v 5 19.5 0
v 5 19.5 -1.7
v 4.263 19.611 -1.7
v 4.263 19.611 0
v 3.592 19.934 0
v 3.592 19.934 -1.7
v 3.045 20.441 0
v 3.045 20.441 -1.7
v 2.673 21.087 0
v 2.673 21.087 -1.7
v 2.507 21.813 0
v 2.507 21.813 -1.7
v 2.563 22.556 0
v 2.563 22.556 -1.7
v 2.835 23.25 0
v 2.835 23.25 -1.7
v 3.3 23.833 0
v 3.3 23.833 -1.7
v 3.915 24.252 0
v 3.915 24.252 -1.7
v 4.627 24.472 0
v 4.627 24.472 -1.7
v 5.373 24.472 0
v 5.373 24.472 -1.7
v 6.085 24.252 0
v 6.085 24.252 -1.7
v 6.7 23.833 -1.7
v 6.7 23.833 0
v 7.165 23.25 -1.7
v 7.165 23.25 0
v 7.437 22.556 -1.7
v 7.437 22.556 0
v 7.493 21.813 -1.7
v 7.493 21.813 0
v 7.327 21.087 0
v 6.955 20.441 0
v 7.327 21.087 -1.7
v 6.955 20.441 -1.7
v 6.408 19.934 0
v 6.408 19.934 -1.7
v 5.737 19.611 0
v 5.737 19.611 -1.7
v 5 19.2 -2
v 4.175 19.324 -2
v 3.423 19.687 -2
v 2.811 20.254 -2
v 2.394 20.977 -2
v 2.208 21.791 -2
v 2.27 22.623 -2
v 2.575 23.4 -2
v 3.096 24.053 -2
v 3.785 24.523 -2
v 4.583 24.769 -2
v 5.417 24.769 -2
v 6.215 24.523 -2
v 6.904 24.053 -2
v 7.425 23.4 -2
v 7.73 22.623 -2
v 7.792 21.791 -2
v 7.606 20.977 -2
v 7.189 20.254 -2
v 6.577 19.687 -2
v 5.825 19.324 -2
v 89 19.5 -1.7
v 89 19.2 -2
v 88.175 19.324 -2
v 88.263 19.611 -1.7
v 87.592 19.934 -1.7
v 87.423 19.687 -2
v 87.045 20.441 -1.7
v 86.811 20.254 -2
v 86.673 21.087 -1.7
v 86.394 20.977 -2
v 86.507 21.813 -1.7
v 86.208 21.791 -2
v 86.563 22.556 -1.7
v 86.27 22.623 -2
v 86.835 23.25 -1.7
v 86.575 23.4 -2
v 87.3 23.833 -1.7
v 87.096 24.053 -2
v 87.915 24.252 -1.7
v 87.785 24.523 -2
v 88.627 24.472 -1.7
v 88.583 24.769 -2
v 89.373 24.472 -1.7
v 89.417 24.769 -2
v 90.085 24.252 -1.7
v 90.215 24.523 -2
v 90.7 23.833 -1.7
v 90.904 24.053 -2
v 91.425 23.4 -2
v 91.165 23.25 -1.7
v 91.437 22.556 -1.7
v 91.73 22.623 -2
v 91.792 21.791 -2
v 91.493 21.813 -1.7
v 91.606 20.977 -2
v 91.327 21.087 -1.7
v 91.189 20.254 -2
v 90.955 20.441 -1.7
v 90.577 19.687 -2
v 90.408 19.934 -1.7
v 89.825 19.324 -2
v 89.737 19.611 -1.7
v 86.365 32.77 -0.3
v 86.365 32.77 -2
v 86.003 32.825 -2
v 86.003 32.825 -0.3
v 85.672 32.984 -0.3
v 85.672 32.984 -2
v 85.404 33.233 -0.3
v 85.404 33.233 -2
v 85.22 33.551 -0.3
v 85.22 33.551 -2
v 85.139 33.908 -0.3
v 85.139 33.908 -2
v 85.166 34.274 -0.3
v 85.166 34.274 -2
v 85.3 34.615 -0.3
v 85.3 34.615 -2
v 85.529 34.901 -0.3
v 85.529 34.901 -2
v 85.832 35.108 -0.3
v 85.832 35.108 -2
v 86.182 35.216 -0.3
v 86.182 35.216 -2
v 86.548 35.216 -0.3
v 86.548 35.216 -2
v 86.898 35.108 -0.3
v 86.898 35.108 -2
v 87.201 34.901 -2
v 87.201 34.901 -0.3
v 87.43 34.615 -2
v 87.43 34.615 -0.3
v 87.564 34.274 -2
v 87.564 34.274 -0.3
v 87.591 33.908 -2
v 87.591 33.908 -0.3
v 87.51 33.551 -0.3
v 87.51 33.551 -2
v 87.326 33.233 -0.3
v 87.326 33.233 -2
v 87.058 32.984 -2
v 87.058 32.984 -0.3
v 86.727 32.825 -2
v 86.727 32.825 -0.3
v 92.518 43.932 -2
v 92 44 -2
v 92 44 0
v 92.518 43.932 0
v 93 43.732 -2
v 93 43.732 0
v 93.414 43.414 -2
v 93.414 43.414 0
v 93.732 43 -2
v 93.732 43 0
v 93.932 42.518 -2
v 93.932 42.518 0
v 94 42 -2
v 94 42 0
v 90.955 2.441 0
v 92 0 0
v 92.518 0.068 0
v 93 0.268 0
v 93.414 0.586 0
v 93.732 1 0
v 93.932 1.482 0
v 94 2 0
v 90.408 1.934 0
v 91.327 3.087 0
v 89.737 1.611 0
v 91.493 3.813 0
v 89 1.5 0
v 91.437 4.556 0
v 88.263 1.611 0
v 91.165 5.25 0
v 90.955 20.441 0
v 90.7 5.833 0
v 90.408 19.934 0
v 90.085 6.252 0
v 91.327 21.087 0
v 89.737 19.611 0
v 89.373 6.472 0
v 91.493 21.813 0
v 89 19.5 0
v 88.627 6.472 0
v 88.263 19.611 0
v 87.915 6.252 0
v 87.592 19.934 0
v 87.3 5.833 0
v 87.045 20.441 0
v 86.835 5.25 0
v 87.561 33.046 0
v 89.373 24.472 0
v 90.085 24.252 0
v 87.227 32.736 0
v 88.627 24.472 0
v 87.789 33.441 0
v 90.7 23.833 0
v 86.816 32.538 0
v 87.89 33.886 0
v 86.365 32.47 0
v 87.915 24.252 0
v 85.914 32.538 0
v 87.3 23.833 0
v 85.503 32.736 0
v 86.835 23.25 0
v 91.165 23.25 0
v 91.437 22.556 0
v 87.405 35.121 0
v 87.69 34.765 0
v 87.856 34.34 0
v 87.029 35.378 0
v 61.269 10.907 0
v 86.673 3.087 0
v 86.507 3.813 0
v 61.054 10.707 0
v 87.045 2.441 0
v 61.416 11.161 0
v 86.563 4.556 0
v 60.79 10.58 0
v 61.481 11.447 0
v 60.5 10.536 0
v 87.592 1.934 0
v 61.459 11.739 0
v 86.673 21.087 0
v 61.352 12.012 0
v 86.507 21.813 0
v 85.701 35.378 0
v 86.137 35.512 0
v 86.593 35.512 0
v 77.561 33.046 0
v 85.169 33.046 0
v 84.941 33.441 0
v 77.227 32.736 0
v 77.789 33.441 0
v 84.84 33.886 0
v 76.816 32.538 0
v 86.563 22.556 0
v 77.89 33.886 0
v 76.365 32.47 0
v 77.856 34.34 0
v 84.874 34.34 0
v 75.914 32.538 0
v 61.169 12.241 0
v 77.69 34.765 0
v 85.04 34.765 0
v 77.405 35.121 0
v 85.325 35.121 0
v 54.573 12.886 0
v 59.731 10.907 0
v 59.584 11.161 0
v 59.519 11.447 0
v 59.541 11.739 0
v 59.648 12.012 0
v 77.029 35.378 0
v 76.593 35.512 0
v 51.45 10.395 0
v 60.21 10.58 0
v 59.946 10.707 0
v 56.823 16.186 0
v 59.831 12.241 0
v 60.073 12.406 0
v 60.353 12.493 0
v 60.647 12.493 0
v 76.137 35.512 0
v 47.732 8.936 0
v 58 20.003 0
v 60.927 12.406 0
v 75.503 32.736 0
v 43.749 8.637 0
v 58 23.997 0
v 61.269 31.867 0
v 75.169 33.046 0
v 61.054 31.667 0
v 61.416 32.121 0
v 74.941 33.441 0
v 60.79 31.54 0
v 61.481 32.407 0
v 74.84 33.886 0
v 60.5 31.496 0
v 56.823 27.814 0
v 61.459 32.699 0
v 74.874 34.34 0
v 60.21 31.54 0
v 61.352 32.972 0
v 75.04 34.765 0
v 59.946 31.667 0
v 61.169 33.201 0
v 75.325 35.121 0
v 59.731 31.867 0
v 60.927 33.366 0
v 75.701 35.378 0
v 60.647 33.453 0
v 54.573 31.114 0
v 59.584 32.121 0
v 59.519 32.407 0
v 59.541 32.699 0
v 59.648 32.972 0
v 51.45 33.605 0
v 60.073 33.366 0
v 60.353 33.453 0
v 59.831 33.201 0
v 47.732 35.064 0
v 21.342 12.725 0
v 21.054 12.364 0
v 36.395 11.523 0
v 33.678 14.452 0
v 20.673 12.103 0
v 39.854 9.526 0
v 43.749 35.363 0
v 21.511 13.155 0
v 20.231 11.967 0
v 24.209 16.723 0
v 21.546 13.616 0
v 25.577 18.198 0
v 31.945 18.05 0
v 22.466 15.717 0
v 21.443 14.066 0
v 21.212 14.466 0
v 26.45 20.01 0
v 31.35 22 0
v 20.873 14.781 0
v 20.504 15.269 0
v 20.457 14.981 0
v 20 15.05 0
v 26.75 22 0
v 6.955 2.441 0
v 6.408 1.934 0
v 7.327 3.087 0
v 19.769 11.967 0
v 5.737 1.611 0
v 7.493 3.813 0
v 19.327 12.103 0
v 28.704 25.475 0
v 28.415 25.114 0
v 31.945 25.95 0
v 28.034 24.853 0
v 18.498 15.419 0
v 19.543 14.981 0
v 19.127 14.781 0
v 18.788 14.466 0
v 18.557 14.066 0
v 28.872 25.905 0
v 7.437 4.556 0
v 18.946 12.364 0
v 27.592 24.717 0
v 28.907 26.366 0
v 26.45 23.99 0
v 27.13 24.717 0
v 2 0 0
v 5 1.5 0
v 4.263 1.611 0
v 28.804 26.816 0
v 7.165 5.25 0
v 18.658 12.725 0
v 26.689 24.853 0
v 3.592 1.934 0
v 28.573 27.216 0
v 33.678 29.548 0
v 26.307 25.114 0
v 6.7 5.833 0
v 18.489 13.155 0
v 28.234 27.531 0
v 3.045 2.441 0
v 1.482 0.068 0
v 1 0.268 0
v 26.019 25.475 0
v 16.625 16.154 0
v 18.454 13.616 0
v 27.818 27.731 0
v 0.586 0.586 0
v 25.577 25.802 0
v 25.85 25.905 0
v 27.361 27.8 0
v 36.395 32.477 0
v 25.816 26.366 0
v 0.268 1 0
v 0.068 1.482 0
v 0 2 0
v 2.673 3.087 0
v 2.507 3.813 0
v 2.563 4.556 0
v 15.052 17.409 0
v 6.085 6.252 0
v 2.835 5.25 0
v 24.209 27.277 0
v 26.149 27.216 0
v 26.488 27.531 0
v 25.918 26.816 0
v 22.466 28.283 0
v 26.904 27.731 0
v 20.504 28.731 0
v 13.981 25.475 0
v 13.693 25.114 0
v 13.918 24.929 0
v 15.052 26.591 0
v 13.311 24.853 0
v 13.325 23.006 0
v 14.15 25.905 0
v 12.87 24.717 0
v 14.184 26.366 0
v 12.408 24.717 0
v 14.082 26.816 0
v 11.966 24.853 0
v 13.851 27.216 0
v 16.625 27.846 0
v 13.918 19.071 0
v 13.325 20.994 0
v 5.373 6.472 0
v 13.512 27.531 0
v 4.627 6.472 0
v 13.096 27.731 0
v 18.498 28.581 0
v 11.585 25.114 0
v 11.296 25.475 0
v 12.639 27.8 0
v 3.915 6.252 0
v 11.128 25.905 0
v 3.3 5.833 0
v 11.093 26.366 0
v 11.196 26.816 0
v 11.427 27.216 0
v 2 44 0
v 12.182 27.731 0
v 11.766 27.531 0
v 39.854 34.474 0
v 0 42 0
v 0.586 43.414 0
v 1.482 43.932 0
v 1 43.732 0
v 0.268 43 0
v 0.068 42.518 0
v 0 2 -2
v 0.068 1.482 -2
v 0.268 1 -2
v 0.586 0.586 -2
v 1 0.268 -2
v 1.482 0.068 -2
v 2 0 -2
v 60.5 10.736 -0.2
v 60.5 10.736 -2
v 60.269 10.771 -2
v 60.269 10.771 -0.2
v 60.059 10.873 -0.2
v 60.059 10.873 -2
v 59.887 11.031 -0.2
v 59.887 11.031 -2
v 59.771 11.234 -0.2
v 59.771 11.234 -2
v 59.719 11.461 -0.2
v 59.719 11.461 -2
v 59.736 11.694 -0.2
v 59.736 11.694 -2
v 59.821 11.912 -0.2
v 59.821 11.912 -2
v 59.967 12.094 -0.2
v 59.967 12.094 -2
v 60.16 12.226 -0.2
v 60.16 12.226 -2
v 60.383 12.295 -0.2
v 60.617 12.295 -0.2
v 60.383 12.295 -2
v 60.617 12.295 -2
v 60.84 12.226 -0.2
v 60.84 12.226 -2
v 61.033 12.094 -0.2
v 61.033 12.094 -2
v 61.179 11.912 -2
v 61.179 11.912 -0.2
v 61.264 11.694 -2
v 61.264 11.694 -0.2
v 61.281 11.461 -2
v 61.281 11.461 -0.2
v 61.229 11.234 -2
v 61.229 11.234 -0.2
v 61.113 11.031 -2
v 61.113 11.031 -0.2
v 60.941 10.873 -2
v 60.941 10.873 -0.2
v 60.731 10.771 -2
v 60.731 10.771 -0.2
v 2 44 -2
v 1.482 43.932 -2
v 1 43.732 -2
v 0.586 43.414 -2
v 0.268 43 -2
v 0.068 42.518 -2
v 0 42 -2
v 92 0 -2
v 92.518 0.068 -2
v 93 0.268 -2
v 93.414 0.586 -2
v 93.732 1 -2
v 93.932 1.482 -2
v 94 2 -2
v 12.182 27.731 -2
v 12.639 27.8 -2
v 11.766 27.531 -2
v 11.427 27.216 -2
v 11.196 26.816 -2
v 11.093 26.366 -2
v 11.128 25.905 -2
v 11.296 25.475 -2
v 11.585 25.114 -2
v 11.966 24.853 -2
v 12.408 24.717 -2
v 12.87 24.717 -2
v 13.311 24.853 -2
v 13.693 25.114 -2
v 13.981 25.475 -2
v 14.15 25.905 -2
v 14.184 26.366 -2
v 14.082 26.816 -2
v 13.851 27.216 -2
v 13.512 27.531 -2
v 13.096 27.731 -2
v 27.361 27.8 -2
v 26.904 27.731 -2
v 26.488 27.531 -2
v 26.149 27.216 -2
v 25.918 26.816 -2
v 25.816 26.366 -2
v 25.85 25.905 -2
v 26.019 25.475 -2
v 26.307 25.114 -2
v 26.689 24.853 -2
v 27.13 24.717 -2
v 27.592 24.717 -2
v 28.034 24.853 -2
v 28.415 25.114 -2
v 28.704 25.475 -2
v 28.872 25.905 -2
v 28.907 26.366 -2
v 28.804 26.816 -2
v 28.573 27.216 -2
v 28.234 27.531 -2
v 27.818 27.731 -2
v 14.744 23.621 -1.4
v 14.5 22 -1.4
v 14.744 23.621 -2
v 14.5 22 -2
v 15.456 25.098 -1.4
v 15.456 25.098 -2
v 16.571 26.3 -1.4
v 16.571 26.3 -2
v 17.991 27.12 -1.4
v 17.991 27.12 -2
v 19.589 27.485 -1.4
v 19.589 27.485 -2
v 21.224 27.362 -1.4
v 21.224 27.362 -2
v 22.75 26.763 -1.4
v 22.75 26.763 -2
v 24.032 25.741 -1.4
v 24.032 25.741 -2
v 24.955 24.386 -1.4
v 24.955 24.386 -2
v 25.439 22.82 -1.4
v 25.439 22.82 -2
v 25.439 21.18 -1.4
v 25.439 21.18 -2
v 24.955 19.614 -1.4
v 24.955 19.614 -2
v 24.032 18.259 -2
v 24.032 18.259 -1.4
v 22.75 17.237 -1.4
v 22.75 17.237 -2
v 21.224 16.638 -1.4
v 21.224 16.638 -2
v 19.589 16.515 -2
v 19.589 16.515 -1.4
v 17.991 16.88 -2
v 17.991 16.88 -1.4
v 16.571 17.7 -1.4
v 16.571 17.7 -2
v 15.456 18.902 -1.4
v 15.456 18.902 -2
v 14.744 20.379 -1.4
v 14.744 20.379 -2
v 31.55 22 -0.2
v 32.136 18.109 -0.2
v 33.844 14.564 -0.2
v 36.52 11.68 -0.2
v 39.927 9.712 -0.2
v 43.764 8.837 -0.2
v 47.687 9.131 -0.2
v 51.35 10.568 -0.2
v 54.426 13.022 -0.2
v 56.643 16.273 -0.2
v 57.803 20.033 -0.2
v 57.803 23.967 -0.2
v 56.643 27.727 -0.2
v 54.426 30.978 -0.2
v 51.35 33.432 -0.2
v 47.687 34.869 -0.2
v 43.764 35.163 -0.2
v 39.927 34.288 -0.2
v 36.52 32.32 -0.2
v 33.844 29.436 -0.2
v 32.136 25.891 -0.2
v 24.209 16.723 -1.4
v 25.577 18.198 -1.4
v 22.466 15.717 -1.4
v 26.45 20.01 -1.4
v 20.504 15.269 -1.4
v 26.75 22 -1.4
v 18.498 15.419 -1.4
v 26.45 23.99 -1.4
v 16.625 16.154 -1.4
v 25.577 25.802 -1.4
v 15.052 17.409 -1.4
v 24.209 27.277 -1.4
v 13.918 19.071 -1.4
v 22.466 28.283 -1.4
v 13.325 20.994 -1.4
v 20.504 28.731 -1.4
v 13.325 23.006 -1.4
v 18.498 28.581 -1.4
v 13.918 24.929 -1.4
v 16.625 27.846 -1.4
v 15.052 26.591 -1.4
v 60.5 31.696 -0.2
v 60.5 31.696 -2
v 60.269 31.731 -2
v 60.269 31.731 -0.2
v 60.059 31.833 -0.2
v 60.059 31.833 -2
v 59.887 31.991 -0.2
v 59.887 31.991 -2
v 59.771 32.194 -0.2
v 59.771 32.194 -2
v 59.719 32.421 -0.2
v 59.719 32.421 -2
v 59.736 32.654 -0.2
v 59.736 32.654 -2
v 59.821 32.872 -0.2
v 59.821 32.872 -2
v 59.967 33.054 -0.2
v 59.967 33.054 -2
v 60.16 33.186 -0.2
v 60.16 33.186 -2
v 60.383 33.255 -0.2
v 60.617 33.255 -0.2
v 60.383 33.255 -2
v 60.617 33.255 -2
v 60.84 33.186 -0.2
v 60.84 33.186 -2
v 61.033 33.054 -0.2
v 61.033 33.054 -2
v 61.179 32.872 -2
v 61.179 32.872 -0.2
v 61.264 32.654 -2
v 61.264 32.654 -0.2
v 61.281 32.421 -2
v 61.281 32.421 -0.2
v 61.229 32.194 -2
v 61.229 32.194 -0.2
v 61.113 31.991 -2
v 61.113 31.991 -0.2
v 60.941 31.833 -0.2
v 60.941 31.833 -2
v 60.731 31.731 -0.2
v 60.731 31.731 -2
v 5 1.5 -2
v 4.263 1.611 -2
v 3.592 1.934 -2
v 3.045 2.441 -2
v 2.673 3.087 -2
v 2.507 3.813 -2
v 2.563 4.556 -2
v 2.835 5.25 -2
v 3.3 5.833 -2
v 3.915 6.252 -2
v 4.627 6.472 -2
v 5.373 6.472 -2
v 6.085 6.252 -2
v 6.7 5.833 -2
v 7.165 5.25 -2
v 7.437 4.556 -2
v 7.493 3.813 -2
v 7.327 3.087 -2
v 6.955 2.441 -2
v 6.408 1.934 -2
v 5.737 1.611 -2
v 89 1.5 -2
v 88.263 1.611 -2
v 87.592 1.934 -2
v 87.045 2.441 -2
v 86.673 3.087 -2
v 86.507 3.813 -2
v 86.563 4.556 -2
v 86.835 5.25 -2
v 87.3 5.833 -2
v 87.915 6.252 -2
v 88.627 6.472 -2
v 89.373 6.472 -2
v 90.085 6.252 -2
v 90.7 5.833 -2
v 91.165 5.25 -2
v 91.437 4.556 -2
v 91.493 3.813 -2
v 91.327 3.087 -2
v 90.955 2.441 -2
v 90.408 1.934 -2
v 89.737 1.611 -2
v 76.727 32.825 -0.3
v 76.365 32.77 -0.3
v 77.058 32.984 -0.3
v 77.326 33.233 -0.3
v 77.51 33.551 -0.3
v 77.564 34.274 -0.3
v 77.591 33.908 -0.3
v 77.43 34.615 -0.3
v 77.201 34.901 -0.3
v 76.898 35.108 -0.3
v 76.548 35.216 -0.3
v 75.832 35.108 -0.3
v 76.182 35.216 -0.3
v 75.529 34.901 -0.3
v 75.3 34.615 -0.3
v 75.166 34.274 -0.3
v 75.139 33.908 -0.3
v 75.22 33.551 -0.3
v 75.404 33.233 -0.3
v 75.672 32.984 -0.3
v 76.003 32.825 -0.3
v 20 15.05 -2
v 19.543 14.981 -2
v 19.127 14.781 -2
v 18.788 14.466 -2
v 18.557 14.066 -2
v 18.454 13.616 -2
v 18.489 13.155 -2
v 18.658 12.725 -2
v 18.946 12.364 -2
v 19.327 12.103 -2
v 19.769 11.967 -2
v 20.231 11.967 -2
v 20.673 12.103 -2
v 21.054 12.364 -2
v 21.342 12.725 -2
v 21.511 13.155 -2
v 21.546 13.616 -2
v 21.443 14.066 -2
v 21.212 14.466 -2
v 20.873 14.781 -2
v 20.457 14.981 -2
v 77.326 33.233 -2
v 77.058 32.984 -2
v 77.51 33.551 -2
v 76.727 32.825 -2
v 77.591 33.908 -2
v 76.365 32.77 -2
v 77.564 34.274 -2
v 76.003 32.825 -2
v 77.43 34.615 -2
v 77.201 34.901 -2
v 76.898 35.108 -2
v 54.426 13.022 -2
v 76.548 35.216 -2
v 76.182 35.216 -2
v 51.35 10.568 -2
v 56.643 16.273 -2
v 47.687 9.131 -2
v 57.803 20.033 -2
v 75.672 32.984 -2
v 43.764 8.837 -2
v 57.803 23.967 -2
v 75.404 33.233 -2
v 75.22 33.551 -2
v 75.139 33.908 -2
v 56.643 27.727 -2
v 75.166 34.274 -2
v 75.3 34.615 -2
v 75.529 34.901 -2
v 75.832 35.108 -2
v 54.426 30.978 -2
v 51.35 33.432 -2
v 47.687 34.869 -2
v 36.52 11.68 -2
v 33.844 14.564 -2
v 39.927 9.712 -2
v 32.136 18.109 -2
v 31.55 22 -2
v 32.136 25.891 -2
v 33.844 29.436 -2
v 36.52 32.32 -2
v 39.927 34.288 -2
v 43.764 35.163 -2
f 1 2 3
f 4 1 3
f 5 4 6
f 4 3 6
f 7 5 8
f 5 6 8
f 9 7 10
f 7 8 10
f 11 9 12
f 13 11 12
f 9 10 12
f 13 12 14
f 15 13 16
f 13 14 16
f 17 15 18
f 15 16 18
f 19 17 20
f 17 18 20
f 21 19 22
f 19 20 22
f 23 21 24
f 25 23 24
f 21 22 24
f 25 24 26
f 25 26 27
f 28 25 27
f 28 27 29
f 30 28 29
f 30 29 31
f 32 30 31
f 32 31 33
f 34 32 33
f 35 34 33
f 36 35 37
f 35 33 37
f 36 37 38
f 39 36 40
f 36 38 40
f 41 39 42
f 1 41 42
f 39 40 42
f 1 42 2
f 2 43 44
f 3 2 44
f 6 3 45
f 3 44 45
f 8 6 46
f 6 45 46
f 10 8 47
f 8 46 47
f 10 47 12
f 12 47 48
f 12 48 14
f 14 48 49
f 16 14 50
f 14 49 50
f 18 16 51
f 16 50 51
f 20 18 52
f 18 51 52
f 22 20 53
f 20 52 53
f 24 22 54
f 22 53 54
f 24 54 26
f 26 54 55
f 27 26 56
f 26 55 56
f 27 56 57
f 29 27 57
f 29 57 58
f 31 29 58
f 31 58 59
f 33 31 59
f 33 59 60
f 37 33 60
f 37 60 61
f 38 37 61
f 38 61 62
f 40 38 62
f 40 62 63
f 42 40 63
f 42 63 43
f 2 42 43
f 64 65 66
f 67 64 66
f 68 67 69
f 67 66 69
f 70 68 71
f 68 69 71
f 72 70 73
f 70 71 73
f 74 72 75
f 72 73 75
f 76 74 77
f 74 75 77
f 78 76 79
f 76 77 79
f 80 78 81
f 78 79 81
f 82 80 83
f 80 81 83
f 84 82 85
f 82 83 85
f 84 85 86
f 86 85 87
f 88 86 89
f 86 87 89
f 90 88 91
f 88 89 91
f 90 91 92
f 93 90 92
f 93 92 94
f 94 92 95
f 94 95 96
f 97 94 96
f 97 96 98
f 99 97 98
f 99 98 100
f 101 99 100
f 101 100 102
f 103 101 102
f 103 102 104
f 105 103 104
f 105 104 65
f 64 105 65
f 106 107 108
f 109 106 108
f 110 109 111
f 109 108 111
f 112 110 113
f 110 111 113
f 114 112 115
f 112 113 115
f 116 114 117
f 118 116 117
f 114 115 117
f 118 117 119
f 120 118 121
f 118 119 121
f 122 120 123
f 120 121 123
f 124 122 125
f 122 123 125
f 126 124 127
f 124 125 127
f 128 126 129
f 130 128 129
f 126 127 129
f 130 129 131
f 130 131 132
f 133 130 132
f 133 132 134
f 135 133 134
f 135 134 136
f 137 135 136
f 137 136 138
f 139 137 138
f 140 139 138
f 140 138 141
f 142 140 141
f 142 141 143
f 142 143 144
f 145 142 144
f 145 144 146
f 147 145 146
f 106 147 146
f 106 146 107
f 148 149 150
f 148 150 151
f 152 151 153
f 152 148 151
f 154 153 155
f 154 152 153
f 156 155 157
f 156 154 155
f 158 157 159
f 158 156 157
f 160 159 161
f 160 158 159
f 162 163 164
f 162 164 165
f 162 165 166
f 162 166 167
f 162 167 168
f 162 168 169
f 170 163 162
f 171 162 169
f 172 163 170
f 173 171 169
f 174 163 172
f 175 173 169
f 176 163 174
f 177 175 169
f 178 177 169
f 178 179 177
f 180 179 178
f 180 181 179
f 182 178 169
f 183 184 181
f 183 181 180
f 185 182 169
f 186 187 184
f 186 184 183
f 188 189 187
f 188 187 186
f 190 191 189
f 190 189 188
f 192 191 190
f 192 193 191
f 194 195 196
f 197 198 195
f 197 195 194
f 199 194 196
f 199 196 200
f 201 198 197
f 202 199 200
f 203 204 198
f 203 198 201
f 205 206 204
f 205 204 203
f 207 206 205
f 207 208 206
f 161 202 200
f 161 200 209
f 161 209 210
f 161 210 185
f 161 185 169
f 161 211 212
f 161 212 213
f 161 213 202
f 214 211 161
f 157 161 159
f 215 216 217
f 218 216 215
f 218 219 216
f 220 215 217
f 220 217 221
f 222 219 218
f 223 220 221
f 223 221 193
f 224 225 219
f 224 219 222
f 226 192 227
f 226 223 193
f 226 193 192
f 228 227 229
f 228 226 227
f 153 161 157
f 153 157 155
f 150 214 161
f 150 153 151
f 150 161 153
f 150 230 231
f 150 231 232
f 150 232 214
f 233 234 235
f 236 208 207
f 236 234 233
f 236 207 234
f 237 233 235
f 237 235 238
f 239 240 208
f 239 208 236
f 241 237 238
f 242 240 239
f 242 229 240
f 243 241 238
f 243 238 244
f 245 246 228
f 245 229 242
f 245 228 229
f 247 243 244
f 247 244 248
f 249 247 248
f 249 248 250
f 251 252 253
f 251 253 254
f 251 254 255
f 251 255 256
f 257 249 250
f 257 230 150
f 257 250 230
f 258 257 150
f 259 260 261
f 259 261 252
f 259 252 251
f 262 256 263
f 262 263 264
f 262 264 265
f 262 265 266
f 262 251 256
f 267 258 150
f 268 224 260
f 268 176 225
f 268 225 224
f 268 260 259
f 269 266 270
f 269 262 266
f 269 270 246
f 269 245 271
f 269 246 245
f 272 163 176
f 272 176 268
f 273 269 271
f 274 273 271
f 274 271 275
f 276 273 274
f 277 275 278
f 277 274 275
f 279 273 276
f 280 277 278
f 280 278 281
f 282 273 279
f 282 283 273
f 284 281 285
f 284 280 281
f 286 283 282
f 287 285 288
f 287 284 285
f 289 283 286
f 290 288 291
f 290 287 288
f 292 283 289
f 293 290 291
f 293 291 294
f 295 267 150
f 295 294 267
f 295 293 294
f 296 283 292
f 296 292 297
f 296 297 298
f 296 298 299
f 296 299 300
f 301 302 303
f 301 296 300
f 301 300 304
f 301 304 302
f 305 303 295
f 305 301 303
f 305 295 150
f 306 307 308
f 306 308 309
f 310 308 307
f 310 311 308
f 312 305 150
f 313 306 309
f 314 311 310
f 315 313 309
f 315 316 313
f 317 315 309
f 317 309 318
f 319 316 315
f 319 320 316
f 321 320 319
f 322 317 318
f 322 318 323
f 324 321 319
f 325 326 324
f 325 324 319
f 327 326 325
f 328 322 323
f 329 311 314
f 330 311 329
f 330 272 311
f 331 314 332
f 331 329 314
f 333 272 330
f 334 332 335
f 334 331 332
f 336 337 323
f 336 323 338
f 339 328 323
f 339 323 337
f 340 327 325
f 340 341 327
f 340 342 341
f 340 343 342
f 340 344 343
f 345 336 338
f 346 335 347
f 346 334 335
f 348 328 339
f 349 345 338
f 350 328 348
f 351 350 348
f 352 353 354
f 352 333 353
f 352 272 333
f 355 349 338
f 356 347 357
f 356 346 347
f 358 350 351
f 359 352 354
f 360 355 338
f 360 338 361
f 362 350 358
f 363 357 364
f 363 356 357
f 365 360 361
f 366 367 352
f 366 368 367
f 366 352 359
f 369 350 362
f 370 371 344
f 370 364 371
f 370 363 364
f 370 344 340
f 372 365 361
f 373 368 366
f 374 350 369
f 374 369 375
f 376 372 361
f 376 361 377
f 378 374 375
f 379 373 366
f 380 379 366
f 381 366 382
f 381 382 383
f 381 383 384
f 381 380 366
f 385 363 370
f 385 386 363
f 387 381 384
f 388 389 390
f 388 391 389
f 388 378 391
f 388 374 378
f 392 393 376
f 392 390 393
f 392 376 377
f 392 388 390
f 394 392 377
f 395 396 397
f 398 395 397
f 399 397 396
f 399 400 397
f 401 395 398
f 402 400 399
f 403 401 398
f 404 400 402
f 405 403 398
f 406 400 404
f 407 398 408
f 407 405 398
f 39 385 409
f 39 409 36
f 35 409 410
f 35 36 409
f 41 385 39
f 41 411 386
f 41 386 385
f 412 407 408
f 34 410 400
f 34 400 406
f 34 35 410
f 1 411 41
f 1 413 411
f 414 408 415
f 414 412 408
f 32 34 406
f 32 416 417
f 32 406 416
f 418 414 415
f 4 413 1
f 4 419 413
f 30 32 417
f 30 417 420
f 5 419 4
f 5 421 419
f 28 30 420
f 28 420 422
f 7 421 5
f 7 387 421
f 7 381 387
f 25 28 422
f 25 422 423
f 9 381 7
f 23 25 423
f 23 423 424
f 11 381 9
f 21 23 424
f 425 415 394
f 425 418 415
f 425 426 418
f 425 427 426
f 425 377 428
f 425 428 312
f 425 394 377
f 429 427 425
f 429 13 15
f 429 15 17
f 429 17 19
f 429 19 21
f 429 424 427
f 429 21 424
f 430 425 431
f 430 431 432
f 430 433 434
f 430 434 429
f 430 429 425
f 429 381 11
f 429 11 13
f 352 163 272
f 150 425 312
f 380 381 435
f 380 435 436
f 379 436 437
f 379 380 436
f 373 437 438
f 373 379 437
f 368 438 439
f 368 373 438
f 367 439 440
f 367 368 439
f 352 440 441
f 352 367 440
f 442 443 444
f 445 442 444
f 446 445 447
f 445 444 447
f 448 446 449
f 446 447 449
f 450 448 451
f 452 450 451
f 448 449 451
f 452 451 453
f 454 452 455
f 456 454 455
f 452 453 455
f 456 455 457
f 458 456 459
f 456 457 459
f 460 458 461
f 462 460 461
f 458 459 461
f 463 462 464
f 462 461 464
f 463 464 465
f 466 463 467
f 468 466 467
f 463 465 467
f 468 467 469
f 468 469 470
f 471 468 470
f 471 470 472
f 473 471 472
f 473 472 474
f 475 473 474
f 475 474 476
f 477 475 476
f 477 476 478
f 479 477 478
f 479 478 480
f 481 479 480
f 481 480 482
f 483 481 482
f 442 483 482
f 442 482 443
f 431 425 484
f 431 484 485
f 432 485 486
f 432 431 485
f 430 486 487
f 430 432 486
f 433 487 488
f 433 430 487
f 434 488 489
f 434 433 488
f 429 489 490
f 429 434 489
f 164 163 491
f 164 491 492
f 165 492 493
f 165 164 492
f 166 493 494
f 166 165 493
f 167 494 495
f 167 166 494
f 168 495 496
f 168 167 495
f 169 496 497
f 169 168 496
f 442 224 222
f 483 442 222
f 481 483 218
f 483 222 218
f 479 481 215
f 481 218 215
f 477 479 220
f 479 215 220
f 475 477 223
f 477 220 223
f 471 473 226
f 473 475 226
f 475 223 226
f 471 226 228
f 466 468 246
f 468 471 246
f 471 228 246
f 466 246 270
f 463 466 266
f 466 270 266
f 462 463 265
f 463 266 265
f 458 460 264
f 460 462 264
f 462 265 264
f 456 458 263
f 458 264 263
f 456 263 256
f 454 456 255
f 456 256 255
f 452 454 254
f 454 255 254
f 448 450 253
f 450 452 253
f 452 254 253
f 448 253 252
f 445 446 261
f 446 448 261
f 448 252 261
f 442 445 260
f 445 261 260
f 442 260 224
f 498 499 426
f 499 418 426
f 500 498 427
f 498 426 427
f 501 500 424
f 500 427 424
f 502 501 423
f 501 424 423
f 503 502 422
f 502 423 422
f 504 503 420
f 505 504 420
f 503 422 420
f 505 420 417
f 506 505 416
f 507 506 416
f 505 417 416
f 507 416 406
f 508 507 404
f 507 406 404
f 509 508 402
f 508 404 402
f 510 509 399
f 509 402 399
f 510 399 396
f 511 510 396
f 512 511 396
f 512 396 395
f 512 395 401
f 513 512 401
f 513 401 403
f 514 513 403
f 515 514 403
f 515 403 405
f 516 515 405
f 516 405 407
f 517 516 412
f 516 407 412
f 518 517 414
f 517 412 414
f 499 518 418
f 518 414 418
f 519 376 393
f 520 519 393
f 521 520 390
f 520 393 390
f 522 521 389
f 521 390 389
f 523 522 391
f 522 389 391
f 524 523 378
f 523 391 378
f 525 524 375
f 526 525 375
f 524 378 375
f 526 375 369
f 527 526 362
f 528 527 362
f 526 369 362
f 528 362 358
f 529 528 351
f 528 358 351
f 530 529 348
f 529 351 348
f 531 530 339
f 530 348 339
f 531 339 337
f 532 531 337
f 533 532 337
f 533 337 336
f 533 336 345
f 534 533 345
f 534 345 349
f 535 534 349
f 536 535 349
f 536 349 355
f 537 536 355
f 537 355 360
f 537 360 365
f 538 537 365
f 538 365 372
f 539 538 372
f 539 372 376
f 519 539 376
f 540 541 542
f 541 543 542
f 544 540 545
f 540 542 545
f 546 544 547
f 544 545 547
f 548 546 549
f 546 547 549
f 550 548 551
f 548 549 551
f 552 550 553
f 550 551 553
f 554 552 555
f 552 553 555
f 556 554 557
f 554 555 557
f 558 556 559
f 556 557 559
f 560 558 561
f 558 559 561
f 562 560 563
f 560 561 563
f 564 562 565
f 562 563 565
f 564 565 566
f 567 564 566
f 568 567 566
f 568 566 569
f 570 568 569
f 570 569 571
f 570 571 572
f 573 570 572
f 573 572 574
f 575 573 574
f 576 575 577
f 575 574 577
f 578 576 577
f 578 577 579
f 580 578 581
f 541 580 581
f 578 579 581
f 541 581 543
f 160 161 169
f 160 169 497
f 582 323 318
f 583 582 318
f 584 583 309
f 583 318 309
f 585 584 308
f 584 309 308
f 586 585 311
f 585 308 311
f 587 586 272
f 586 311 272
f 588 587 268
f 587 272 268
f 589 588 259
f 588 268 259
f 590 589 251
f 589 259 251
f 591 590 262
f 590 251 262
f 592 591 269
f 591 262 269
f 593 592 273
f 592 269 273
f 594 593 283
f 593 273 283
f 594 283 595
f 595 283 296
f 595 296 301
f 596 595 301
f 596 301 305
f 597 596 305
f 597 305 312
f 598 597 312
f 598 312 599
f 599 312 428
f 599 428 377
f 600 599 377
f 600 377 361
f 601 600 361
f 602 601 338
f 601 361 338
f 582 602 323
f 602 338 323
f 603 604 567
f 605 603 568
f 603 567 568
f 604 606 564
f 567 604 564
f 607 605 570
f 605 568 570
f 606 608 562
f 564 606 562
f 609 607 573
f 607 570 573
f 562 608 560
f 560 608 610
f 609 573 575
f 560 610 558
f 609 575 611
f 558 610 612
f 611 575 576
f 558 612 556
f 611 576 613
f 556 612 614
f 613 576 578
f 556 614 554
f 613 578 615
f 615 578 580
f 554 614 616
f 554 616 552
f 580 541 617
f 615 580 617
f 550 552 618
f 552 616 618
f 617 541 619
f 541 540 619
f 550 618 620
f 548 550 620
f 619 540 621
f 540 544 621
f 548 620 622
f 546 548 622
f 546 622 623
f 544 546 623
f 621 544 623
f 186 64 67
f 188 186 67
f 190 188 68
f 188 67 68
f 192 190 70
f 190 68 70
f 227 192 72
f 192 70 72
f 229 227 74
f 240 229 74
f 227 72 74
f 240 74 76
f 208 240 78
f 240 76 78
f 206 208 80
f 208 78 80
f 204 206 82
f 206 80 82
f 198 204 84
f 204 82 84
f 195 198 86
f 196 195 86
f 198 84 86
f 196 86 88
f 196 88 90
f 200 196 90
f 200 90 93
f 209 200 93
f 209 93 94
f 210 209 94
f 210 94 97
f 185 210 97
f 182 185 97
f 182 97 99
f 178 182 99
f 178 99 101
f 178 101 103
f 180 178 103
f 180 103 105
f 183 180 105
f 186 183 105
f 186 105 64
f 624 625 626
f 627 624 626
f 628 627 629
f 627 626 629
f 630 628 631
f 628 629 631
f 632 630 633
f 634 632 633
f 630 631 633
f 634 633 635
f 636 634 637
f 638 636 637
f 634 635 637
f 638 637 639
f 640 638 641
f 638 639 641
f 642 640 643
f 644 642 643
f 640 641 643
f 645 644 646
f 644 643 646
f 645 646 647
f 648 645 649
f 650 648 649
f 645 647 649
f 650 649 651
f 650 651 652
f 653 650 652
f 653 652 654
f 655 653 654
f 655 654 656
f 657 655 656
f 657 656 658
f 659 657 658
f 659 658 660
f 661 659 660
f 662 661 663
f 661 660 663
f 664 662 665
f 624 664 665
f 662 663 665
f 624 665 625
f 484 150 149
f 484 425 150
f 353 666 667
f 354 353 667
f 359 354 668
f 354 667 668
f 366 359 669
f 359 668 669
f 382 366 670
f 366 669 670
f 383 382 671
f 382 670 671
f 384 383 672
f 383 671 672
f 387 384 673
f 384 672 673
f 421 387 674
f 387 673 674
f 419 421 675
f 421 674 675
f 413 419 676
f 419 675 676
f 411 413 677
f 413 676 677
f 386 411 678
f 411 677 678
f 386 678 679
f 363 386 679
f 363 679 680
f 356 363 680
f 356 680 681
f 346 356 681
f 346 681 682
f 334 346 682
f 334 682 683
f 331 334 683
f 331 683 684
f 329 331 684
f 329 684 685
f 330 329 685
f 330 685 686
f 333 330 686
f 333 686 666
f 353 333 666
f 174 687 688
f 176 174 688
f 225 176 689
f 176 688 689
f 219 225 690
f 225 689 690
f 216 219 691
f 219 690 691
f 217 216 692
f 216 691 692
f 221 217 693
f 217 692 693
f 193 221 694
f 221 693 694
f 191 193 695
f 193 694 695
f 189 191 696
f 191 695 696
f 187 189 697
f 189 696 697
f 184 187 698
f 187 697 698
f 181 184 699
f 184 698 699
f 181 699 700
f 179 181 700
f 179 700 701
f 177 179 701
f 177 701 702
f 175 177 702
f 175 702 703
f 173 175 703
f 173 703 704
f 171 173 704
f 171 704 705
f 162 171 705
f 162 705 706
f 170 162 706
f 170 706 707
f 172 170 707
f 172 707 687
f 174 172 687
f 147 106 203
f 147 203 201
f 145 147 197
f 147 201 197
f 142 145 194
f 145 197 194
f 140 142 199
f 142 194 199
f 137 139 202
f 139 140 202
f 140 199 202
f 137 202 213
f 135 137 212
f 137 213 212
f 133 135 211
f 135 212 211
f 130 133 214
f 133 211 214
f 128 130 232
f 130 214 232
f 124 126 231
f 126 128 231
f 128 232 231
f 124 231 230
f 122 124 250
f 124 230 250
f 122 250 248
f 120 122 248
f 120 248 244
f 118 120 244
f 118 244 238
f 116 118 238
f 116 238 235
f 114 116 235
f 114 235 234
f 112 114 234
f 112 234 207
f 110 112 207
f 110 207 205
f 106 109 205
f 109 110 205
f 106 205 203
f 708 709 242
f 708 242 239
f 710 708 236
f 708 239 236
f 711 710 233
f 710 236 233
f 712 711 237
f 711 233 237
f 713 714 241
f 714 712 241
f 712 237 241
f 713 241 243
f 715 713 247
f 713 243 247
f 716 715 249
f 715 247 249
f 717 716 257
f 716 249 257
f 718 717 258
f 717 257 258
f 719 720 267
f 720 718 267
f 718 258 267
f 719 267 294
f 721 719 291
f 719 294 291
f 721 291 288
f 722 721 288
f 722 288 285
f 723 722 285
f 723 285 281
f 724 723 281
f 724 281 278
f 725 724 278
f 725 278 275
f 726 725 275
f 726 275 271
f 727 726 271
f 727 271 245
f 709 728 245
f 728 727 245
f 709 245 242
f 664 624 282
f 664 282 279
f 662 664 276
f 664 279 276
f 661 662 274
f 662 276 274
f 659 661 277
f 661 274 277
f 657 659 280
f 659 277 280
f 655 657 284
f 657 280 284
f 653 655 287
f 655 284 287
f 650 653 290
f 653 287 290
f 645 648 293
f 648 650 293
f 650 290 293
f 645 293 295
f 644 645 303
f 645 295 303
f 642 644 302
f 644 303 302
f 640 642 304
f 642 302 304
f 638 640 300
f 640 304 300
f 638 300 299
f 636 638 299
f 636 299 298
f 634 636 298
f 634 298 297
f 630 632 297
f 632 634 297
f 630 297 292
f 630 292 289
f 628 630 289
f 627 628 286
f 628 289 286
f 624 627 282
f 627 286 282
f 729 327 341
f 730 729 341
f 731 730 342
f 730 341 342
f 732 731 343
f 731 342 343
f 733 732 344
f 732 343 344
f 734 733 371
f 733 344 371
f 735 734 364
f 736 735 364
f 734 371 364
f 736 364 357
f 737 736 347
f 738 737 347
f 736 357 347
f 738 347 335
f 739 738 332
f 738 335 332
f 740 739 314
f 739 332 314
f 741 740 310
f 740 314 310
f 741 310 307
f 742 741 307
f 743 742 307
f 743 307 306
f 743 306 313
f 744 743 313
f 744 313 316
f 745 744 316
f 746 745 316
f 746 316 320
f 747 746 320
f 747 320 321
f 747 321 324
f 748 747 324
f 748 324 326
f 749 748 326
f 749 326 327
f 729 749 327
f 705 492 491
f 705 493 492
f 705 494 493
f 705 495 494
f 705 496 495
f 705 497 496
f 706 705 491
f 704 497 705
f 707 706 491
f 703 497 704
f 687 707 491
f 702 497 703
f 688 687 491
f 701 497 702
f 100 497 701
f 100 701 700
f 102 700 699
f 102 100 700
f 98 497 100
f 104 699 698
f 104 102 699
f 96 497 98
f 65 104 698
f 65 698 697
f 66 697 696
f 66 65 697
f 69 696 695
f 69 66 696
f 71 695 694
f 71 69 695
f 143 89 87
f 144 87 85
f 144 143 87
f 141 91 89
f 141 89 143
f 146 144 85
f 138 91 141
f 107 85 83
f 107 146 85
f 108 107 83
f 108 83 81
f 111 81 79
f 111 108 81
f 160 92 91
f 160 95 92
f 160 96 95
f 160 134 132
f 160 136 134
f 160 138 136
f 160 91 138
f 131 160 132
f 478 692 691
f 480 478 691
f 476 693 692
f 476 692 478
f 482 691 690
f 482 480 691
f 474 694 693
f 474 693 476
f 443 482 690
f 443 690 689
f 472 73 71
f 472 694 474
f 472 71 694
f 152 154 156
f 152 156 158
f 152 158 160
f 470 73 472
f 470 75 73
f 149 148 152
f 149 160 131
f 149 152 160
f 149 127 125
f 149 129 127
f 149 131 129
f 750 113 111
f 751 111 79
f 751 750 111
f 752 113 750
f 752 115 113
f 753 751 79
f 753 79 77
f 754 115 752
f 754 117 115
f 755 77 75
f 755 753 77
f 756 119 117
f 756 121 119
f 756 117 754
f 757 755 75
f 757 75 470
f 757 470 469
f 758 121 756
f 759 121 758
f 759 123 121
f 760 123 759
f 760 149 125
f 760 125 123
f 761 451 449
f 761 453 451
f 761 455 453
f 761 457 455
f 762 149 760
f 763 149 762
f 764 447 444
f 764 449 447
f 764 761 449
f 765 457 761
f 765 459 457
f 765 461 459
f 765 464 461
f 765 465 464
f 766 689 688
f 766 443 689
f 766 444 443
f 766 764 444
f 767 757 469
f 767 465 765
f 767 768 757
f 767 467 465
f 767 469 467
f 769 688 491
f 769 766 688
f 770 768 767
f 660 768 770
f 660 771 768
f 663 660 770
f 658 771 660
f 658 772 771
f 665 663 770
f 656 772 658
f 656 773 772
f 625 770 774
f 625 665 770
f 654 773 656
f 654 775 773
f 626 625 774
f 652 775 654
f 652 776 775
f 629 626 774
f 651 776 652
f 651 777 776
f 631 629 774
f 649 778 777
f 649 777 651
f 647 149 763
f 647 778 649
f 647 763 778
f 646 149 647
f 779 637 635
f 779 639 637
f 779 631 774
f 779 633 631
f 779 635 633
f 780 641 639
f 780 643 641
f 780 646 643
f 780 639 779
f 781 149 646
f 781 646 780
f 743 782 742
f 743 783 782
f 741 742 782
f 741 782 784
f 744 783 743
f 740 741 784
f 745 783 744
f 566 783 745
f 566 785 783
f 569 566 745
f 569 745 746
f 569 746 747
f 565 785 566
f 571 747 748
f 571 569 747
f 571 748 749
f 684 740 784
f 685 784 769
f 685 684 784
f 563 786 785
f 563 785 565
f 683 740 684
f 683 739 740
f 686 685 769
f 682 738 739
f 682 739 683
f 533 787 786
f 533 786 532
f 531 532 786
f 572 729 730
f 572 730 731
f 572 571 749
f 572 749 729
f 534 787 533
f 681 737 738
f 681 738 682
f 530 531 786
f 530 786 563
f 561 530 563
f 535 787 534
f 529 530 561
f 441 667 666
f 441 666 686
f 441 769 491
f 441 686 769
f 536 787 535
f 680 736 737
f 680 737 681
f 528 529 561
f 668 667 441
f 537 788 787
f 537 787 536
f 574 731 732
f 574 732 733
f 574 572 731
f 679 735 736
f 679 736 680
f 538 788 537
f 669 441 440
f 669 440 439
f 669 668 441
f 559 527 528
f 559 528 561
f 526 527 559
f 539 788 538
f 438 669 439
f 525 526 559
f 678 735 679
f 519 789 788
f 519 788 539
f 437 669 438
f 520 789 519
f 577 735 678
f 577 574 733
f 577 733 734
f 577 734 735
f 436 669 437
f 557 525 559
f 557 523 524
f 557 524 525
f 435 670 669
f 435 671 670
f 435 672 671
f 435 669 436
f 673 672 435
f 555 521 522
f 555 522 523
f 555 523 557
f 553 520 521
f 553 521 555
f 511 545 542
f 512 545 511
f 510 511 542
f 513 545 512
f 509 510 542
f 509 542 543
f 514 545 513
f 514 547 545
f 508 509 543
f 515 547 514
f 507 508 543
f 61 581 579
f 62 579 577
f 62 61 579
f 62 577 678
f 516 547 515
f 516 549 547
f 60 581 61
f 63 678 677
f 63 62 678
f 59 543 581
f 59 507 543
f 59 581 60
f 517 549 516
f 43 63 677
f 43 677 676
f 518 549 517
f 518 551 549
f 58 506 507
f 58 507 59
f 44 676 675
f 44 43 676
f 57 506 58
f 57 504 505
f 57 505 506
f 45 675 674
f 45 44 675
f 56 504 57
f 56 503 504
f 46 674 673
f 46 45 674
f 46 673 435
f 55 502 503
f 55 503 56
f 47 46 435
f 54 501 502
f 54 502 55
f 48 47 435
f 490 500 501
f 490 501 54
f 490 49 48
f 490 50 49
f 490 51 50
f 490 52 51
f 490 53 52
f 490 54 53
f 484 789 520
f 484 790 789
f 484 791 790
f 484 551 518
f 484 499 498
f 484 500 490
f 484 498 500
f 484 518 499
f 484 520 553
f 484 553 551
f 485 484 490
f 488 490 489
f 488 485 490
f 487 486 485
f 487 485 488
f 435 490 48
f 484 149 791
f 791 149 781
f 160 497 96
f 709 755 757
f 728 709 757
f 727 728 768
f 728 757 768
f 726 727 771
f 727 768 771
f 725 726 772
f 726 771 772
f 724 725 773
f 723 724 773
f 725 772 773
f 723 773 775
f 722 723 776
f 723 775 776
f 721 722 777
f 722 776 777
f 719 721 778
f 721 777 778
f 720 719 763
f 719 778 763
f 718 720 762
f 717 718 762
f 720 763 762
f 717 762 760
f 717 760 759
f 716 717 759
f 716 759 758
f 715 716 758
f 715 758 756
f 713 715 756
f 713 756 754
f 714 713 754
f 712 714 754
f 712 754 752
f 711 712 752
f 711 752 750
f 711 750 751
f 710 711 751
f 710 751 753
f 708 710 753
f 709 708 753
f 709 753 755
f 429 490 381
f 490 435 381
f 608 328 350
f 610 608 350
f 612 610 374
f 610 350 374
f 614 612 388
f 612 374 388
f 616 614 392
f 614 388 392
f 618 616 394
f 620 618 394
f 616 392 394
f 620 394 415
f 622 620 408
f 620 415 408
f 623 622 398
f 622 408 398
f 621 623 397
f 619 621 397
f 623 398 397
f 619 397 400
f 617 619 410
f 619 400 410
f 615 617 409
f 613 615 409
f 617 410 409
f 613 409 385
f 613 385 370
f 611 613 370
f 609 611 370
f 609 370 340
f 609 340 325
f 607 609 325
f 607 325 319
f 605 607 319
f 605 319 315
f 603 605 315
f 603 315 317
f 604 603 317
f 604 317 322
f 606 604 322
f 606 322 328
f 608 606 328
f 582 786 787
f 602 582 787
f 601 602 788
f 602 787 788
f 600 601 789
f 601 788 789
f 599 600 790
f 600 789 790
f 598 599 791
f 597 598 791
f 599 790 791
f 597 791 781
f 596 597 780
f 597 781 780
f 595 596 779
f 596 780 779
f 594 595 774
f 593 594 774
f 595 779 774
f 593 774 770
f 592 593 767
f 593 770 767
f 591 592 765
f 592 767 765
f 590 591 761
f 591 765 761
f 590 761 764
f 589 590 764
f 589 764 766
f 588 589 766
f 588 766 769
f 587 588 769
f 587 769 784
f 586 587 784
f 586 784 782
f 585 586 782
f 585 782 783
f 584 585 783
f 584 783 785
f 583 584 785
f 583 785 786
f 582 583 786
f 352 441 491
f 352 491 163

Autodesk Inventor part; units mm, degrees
ref_plane "YZ Plane" through (0, 0, 0) normal (1, 0, 0) x (0, 1, 0)
ref_plane "XZ Plane" through (0, 0, 0) normal (0, 1, 0) x (-1, 0, 0)
ref_plane "XY Plane" through (0, 0, 0) normal (0, 0, 1) x (1, 0, 0)
sketch "Sketch1" plane through (0, 0, 0) normal (0, 1, 0) x (-1, 0, 0)
  line L0 (0, 0) -> (-40, 0)
  line L1 (-40, 0) -> (-40, -2)
  line L2 (-40, -2) -> (0, -2)
  line L3 (0, -2) -> (0, 0)
  dimension "d0" = 40
  dimension "d1" = 2
extrude "Extrusion1" add sketch "Sketch1" along normal blind 44
sketch "Sketch2" plane through (0, 0, 0) normal (0, 0, 1) x (1, 0, 0)
  line L0 (40, 44) -> (0, 44) construction
  line L1 (0, 44) -> (40, 0) construction
  line L2 (40, 44) -> (0, 0) construction
  circle A0 centre (20, 22) radius 6.75
  dimension "d4" = 13.5
extrude "Extrusion2" cut sketch "Sketch2" against normal blind 40
sketch "Sketch3" plane through (40, 0, -2) normal (0, 0, -1) x (-1, 0, 0)
  circle A0 centre (20, 22) radius 6.75 construction
  circle A1 centre (20, 22) radius 8.5 construction
  circle A2 centre (12.6388, 26.25) radius 1.1 construction
  circle A3 centre (27.3612, 26.25) radius 1.1 construction
  line L0 (20, 22) -> (27.3612, 26.25) construction
  line L1 (20, 22) -> (12.6388, 26.25) construction
  circle A4 centre (20, 13.5) radius 1.1 construction
  line L2 (20, 22) -> (20, 13.5) construction
  line L3 (40, 0) -> (40, 44) construction
  dimension "d7" = 17
  dimension "d9" = 2.2
  dimension "d10" = 2.2
  dimension "d22" = 2.2
  dimension "d25" = 120
  dimension "d26" = 120
hole "Hole1" at (20, 13.5, -2) at (12.6388, 26.25, -2) at (27.3612, 26.25, -2) direction (0, 0, 1) diameter 3.1 depth 8.8 tip angle 118 clearance for "Countersunk Flat Head Screw ISO 2009/7046" size "M3" standard "ISO"
sketch "Sketch4" plane through (40, 0, 0) normal (1, 0, 0) x (0, 0, -1)
  line L0 (0, 44) -> (2, 44) projected
  line L1 (0, 0) -> (2, 0)
  line L2 (2, 0) -> (2, 44)
  line L3 (2, 44) -> (0, 44)
  line L4 (0, 44) -> (0, 0)
extrude "Extrusion3" add sketch "Sketch4" along normal blind 20
sketch "Sketch5" plane through (0, 0, -2) normal (0, 0, -1) x (-1, 0, 0)
  circle A0 centre (-44.75, 22) radius 13.2
  line L0 (0, 0) -> (-60, 0) projected
  line L1 (-60, 0) -> (-60.0955, 41.9998)
  line L2 (0, 0) -> (0, 44) projected
  dimension "d27" = 26.4
  dimension "d28" = 22
  dimension "d29" = 15.3
  dimension "d45" = 44.75
extrude "Extrusion4" cut sketch "Sketch5" against normal through all
sketch "Sketch6" plane through (60, 0, 0) normal (1, 0, 0) x (0, 0, -1)
  line L0 (0, 0) -> (0, 44) projected
  line L1 (2, 0) -> (0, 0) projected
  line L2 (0, 44) -> (2, 44)
  line L3 (2, 44) -> (2, 0)
  line L4 (2, 0) -> (0, 0)
  line L5 (0, 0) -> (0, 44)
extrude "Extrusion5" add sketch "Sketch6" along normal blind 34
fillet "Fillet1" radius 2 4 edges at (0, 44, -1) (0, 0, -1) (94, 44, -1) (94, 0, -1)
sketch "Sketch7" plane through (2, 0, 0) normal (0, 0, 1) x (1, 0, 0)
  circle A0 centre (87, 22) radius 2.5
  circle A1 centre (3, 22) radius 2.5
  line L0 (0, 44) -> (90, 44) projected
  line L1 (92, 42) -> (92, 2) projected
  line L2 (0, 0) -> (90, 0) projected
  line L3 (-2, 2) -> (-2, 42) projected
  circle A2 centre (87, 4) radius 2.5
  circle A3 centre (3, 4) radius 2.5
  point P0 (-2, 0)
  dimension "d53" = 5
  dimension "d54" = 5
  dimension "d55" = 22
  dimension "d56" = 5
  dimension "d57" = 22
  dimension "d58" = 5
  dimension "d69" = 44
  dimension "d73" = 5
  dimension "d74" = 18
  dimension "d75" = 5
hole "Hole2" at (5, 22, 0) at (89, 22, 0) at (89, 4, 0) at (5, 4, 0) direction (0, 0, -1) diameter 5 depth 14.2 tip angle 118
chamfer "Chamfer1" distance 0.3 angle 45 2 edges at (5, 24.5, -2) (89, 24.5, -2)
sketch "Sketch8" plane through (92, 0, -2) normal (0, 0, -1) x (-1, 0, 0)
  circle A0 centre (72, 22) radius 6.75 projected
  circle A1 centre (72, 22) radius 6.75
  circle A2 centre (72, 22) radius 5.5
  point P0 (92, 0)
  dimension "d70" = 11
extrude "Extrusion6" add sketch "Sketch8" against normal blind 0.6
sketch "Sketch9" plane through (2, 0, 0) normal (0, 0, 1) x (1, 0, 0)
  circle A0 centre (58.5, 32.48) radius 1
  circle A1 centre (58.5, 11.52) radius 1
  line L0 (0, 44) -> (90, 44) projected
  line L1 (0, 0) -> (90, 0) projected
  line L2 (92, 42) -> (92, 2) projected
  point P0 (-2, 0)
  dimension "d76" = 2
  dimension "d77" = 2
  dimension "d78" = 20.96
  dimension "d79" = 44
  dimension "d80" = 11.52
  dimension "d81" = 33.5
hole "Hole3" at (60.5, 11.52, 0) at (60.5, 32.48, 0) direction (0, 0, -1) diameter 1.567 depth 6.3 tip angle 118 thread size "M2x0.4" class "6H" standard "ISO Metric profile"
chamfer "Chamfer2" distance 0.2 angle 45 1 edges at (57.95, 22, 0)
chamfer "Chamfer3" distance 0.2 angle 45 2 edges at (60.5, 12.3035, 0) (60.5, 33.2635, 0)
sketch "Sketch10" plane through (2, 0, 0) normal (0, 0, 1) x (1, 0, 0)
  circle A0 centre (84.365, 34) radius 1
  circle A1 centre (74.365, 34) radius 1
  line L0 (0, 44) -> (90, 44) projected
  line L1 (92, 42) -> (92, 2) projected
  point P0 (-2, 0)
  dimension "d95" = 2
  dimension "d96" = 2
  dimension "d97" = 10
  dimension "d98" = 10
  dimension "d99" = 7.635
hole "Hole4" at (86.365, 34, 0) at (76.365, 34, 0) direction (0, 0, -1) diameter 2.459 depth 8.8 tip angle 118 thread size "M3x0.5" class "6H" standard "ISO Metric profile"
chamfer "Chamfer4" distance 0.3 angle 45 2 edges at (86.365, 35.2295, 0) (76.365, 35.2295, 0)
equation "\"d55\" = 0.5 * d69"
equation "\"d57\" = 0.5 * d69"
equation "\"d80\" = -0.5 * d78 + 0.5 * d79"
properties part number "płyta silnika"
